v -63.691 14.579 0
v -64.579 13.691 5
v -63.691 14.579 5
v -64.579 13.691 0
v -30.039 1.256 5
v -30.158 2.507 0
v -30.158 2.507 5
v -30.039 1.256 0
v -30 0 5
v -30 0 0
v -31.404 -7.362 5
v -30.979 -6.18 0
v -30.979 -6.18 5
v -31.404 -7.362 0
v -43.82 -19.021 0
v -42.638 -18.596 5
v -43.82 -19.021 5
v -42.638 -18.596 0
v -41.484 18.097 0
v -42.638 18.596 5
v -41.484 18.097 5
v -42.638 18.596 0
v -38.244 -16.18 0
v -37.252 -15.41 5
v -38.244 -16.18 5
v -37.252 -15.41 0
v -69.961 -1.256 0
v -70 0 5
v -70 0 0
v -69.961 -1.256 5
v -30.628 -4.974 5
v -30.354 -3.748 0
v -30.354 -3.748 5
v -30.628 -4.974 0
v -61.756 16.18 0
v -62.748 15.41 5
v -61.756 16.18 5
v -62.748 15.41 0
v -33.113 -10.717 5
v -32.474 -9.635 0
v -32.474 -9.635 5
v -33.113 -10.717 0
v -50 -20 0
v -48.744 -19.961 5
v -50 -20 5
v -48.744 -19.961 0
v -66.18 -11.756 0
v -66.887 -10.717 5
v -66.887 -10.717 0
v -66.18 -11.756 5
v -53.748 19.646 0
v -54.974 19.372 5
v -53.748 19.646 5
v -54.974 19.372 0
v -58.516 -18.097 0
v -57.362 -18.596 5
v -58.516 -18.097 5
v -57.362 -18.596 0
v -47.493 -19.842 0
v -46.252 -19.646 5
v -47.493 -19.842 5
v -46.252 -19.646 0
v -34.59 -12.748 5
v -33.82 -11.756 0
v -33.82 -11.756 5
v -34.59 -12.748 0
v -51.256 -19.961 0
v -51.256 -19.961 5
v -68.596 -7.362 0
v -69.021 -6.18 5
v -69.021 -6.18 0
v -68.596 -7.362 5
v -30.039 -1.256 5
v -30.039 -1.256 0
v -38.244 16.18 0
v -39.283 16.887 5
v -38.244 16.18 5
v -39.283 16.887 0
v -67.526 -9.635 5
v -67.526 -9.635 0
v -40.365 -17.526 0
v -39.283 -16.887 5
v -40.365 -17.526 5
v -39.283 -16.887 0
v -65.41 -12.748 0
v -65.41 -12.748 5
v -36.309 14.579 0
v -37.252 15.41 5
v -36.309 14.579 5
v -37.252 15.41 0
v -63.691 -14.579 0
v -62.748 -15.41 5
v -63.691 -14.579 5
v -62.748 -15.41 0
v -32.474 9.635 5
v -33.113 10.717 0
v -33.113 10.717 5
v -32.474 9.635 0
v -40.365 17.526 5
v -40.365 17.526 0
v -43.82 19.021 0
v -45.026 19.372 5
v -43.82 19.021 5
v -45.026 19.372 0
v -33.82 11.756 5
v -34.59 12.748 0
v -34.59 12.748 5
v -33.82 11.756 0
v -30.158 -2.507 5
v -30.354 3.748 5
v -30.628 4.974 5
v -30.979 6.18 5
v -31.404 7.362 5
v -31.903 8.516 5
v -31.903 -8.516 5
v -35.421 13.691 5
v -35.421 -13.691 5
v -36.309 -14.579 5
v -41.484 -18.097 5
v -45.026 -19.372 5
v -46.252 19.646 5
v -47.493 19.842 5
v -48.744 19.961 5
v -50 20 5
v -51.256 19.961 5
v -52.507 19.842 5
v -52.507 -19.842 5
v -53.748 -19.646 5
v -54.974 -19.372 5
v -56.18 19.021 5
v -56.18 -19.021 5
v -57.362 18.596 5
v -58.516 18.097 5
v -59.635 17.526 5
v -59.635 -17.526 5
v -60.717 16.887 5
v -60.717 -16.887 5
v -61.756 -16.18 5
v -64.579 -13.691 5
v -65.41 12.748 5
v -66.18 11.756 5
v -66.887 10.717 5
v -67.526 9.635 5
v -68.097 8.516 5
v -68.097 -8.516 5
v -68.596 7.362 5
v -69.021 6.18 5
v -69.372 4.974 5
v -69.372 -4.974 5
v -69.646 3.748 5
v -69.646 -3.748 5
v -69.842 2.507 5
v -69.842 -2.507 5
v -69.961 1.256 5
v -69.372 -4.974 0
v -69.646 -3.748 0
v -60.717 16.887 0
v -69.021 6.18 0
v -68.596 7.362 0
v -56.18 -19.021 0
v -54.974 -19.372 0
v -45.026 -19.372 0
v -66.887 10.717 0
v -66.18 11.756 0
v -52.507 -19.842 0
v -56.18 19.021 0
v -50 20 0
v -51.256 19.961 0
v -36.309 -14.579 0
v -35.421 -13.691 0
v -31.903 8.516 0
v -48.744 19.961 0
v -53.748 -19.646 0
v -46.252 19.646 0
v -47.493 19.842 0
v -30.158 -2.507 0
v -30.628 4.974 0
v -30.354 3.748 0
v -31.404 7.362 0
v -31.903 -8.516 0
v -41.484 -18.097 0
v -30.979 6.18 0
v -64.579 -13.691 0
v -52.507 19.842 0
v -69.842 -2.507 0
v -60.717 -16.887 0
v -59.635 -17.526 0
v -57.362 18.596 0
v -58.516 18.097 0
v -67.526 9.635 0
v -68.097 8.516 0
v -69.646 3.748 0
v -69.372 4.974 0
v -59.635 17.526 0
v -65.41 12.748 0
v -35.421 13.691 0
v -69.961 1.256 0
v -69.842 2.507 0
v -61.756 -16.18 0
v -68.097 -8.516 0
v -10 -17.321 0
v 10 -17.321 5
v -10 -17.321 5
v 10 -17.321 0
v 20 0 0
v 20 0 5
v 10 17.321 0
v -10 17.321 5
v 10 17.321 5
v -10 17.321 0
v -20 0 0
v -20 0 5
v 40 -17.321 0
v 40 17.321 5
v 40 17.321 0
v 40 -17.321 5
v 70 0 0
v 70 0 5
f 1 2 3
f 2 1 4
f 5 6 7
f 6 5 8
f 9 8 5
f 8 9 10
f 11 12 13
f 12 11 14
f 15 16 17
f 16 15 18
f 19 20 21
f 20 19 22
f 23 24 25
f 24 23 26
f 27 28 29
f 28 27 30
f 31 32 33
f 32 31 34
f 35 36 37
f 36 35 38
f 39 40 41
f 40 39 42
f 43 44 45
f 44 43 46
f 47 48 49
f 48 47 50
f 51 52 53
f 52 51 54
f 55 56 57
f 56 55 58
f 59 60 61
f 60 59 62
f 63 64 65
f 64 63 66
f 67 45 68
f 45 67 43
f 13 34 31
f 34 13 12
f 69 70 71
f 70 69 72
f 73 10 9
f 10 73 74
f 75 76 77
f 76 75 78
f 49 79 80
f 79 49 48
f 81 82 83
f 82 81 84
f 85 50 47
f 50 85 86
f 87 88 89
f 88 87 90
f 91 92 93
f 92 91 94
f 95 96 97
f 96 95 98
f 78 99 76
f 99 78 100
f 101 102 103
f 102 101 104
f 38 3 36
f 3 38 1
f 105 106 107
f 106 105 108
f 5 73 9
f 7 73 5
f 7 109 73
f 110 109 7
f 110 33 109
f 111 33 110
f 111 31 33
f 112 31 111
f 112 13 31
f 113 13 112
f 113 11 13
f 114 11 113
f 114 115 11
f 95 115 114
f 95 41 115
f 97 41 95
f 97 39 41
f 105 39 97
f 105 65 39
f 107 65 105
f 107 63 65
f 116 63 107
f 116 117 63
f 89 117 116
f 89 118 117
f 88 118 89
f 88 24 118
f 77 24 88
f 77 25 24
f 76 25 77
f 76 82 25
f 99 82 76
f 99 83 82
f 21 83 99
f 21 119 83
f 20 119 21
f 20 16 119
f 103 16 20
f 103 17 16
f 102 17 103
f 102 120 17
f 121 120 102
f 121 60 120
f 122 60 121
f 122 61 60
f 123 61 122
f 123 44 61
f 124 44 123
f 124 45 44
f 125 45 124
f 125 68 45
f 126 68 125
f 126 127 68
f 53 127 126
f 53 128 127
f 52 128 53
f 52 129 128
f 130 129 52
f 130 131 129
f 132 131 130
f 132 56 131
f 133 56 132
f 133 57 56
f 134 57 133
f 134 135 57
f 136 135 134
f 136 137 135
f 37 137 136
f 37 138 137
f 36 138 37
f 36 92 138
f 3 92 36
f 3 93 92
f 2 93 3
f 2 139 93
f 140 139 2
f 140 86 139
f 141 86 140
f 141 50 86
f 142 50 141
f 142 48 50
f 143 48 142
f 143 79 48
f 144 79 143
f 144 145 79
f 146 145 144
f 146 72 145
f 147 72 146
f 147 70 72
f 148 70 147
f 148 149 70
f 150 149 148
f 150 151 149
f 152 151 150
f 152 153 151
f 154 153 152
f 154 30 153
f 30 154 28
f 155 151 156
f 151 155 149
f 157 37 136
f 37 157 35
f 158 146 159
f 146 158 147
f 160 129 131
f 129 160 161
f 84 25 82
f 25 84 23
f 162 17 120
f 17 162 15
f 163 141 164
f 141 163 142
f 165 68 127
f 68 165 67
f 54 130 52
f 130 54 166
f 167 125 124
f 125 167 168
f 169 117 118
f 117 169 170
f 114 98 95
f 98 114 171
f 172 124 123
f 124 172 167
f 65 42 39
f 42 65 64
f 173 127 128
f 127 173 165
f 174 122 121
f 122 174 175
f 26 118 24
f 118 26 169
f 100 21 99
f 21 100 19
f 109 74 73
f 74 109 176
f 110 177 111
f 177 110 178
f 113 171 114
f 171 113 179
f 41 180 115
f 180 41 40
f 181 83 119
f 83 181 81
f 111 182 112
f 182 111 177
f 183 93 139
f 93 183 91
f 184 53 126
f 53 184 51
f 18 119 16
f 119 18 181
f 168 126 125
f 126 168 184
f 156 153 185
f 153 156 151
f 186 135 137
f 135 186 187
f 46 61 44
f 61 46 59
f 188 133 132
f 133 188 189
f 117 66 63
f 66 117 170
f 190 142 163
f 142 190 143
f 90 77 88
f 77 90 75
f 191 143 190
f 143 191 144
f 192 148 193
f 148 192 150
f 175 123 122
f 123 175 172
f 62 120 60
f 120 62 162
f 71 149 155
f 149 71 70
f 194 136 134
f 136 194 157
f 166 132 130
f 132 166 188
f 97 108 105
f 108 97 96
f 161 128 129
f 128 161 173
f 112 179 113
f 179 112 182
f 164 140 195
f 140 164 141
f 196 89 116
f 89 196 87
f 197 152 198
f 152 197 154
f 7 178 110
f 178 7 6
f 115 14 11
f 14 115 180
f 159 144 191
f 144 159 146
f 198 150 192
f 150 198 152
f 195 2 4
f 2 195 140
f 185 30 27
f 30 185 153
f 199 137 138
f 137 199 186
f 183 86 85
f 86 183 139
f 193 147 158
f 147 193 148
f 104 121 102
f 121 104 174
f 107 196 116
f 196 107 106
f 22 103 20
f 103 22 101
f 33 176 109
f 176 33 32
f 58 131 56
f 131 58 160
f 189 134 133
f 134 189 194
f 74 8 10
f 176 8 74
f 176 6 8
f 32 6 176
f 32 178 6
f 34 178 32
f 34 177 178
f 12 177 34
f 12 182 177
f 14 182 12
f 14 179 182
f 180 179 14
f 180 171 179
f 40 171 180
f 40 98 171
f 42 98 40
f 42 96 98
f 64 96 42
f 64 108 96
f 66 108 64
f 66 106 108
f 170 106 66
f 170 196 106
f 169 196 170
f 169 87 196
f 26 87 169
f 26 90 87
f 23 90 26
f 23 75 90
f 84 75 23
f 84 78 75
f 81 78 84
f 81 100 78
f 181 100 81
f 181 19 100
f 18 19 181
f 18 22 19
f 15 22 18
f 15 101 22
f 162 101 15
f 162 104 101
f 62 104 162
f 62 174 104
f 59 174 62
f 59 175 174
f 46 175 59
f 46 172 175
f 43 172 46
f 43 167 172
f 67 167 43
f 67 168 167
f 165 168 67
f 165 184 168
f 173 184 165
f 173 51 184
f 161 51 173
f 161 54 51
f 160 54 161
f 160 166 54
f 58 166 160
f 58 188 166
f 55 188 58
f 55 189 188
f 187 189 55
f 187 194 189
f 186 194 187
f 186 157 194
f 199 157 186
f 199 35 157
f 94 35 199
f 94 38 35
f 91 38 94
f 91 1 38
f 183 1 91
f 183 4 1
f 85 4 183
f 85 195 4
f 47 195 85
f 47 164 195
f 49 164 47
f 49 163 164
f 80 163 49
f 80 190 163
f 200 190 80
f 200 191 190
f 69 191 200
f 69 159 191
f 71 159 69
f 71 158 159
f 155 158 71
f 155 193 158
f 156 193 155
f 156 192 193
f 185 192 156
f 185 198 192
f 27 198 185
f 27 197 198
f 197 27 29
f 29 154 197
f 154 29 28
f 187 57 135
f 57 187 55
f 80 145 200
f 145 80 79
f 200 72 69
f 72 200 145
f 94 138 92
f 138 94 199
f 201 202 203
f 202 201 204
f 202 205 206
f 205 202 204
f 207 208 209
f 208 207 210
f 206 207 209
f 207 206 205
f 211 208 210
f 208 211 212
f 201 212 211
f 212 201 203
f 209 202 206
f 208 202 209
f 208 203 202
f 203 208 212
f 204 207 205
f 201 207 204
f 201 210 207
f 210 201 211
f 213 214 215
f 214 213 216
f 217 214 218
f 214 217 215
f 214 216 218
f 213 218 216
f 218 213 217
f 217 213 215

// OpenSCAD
// file: utils/build_plate.scad
// Build Plate representation module
// Made by Makerbot (http://curriculum.makerbot.com/daily_lessons/february/openscad_buildplate.html)

//use this to include a build plate visualization in your openSCAD scripts. Very useful for things designed to be edited in Makerbot Customizer

//to use, either include or use <utils/build_plate.scad>

//then just call build_plate(); with the following arguments (also, you have to have a real object in your scene for this to render)

//putting 0 as the first argument will give you a Replicator 2 build plate
//putting 1 as the first argument will give you a Replicator 1 build plate
//putting 2 as the first argument will give you a Thingomatic build plate
//putting 3 as the first argument will give you a manually adjustable build plate (note: if you use this option, you need to specify your build plates X length (in mm) as the second argument and the Y length (in mm) as the third argument. eg. build_plate(3,150,120);)

/*

to give your user control of which build plate they see in Customizer, include the following code:

use <utils/build_plate.scad>

//for display only, doesn't contribute to final object
build_plate_selector = 0; //[0:Replicator 2,1: Replicator,2:Thingomatic,3:Manual]
//when Build Plate Selector is set to "manual" this controls the build plate x dimension
build_plate_manual_x = 100; //[100:400]
//when Build Plate Selector is set to "manual" this controls the build plate y dimension
build_plate_manual_y = 100; //[100:400]

build_plate(build_plate_selector,build_plate_manual_x,build_plate_manual_y);

*/




//to see how this works, uncomment the following code

//build_plate_selector = 0; //[0:Replicator 2,1: Replicator,2:Thingomatic,3:Manual]
//build_plate_manual_x = 100; //[100:400]
//build_plate_manual_y = 100; //[100:400]
//
//build_plate(build_plate_selector,build_plate_manual_x,build_plate_manual_y);
//
//cube(5);


module build_plate(bp,manX,manY){

		translate([0,0,-.52]){
			if(bp == 0){
				%cube([285,153,1],center = true);
			}
			if(bp == 1){
				%cube([225,145,1],center = true);
			}
			if(bp == 2){
				%cube([120,120,1],center = true);
			}
			if(bp == 3){
				%cube([manX,manY,1],center = true);
			}
		
		}
		translate([0,0,-.5]){
			if(bp == 0){
				for(i = [-14:14]){
					translate([i*10,0,0])
					%cube([.5,153,1.01],center = true);
				}
				for(i = [-7:7]){
					translate([0,i*10,0])
					%cube([285,.5,1.01],center = true);
				}	
			}
			if(bp == 1){
				for(i = [-11:11]){
					translate([i*10,0,0])
						%cube([.5,145,1.01],center = true);
				}
				for(i = [-7:7]){
					translate([0,i*10,0])
						%cube([225,.5,1.01],center = true);
				}
			}
			if(bp == 2){
				for(i = [-6:6]){
					translate([i*10,0,0])
						%cube([.5,120,1.01],center = true);
				}
				for(i = [-6:6]){
					translate([0,i*10,0])
						%cube([120,.5,1.01],center = true);
				}
			}
			if(bp == 3){
				for(i = [-(floor(manX/20)):floor(manX/20)]){
					translate([i*10,0,0])
						%cube([.5,manY,1.01],center = true);
				}
				for(i = [-(floor(manY/20)):floor(manY/20)]){
					translate([0,i*10,0])
						%cube([manX,.5,1.01],center = true);
				}
			}
		}
}
// main file
use <./utils/build_plate.scad> // Cuadricula transparente para la base
build_plate(3, 200,100); // No se incluye al renderizar


//----------------------------------------------------------
//-- Tutorial OpenScad
//-- Juan Gonzalez-Gomez (Obijuan) juan@iearobotics.com
//----------------------------------------------------------
//-- (c) Mayo, 2012
//-- Licencia GPL
//----------------------------------------------------------
//-- Ejemplo de figuras hechas con "cilindros"
//----------------------------------------------------------

//-- Moneda
translate([-50,0,0])
  cylinder(r=40/2, h=5, $fn=100);

//-- Hexágono
cylinder(r=40/2, h=5, $fn=6);

//-- Triángulo equilátero
translate([50,0,0])
  cylinder(r=40/2, h=5, $fn=3);
